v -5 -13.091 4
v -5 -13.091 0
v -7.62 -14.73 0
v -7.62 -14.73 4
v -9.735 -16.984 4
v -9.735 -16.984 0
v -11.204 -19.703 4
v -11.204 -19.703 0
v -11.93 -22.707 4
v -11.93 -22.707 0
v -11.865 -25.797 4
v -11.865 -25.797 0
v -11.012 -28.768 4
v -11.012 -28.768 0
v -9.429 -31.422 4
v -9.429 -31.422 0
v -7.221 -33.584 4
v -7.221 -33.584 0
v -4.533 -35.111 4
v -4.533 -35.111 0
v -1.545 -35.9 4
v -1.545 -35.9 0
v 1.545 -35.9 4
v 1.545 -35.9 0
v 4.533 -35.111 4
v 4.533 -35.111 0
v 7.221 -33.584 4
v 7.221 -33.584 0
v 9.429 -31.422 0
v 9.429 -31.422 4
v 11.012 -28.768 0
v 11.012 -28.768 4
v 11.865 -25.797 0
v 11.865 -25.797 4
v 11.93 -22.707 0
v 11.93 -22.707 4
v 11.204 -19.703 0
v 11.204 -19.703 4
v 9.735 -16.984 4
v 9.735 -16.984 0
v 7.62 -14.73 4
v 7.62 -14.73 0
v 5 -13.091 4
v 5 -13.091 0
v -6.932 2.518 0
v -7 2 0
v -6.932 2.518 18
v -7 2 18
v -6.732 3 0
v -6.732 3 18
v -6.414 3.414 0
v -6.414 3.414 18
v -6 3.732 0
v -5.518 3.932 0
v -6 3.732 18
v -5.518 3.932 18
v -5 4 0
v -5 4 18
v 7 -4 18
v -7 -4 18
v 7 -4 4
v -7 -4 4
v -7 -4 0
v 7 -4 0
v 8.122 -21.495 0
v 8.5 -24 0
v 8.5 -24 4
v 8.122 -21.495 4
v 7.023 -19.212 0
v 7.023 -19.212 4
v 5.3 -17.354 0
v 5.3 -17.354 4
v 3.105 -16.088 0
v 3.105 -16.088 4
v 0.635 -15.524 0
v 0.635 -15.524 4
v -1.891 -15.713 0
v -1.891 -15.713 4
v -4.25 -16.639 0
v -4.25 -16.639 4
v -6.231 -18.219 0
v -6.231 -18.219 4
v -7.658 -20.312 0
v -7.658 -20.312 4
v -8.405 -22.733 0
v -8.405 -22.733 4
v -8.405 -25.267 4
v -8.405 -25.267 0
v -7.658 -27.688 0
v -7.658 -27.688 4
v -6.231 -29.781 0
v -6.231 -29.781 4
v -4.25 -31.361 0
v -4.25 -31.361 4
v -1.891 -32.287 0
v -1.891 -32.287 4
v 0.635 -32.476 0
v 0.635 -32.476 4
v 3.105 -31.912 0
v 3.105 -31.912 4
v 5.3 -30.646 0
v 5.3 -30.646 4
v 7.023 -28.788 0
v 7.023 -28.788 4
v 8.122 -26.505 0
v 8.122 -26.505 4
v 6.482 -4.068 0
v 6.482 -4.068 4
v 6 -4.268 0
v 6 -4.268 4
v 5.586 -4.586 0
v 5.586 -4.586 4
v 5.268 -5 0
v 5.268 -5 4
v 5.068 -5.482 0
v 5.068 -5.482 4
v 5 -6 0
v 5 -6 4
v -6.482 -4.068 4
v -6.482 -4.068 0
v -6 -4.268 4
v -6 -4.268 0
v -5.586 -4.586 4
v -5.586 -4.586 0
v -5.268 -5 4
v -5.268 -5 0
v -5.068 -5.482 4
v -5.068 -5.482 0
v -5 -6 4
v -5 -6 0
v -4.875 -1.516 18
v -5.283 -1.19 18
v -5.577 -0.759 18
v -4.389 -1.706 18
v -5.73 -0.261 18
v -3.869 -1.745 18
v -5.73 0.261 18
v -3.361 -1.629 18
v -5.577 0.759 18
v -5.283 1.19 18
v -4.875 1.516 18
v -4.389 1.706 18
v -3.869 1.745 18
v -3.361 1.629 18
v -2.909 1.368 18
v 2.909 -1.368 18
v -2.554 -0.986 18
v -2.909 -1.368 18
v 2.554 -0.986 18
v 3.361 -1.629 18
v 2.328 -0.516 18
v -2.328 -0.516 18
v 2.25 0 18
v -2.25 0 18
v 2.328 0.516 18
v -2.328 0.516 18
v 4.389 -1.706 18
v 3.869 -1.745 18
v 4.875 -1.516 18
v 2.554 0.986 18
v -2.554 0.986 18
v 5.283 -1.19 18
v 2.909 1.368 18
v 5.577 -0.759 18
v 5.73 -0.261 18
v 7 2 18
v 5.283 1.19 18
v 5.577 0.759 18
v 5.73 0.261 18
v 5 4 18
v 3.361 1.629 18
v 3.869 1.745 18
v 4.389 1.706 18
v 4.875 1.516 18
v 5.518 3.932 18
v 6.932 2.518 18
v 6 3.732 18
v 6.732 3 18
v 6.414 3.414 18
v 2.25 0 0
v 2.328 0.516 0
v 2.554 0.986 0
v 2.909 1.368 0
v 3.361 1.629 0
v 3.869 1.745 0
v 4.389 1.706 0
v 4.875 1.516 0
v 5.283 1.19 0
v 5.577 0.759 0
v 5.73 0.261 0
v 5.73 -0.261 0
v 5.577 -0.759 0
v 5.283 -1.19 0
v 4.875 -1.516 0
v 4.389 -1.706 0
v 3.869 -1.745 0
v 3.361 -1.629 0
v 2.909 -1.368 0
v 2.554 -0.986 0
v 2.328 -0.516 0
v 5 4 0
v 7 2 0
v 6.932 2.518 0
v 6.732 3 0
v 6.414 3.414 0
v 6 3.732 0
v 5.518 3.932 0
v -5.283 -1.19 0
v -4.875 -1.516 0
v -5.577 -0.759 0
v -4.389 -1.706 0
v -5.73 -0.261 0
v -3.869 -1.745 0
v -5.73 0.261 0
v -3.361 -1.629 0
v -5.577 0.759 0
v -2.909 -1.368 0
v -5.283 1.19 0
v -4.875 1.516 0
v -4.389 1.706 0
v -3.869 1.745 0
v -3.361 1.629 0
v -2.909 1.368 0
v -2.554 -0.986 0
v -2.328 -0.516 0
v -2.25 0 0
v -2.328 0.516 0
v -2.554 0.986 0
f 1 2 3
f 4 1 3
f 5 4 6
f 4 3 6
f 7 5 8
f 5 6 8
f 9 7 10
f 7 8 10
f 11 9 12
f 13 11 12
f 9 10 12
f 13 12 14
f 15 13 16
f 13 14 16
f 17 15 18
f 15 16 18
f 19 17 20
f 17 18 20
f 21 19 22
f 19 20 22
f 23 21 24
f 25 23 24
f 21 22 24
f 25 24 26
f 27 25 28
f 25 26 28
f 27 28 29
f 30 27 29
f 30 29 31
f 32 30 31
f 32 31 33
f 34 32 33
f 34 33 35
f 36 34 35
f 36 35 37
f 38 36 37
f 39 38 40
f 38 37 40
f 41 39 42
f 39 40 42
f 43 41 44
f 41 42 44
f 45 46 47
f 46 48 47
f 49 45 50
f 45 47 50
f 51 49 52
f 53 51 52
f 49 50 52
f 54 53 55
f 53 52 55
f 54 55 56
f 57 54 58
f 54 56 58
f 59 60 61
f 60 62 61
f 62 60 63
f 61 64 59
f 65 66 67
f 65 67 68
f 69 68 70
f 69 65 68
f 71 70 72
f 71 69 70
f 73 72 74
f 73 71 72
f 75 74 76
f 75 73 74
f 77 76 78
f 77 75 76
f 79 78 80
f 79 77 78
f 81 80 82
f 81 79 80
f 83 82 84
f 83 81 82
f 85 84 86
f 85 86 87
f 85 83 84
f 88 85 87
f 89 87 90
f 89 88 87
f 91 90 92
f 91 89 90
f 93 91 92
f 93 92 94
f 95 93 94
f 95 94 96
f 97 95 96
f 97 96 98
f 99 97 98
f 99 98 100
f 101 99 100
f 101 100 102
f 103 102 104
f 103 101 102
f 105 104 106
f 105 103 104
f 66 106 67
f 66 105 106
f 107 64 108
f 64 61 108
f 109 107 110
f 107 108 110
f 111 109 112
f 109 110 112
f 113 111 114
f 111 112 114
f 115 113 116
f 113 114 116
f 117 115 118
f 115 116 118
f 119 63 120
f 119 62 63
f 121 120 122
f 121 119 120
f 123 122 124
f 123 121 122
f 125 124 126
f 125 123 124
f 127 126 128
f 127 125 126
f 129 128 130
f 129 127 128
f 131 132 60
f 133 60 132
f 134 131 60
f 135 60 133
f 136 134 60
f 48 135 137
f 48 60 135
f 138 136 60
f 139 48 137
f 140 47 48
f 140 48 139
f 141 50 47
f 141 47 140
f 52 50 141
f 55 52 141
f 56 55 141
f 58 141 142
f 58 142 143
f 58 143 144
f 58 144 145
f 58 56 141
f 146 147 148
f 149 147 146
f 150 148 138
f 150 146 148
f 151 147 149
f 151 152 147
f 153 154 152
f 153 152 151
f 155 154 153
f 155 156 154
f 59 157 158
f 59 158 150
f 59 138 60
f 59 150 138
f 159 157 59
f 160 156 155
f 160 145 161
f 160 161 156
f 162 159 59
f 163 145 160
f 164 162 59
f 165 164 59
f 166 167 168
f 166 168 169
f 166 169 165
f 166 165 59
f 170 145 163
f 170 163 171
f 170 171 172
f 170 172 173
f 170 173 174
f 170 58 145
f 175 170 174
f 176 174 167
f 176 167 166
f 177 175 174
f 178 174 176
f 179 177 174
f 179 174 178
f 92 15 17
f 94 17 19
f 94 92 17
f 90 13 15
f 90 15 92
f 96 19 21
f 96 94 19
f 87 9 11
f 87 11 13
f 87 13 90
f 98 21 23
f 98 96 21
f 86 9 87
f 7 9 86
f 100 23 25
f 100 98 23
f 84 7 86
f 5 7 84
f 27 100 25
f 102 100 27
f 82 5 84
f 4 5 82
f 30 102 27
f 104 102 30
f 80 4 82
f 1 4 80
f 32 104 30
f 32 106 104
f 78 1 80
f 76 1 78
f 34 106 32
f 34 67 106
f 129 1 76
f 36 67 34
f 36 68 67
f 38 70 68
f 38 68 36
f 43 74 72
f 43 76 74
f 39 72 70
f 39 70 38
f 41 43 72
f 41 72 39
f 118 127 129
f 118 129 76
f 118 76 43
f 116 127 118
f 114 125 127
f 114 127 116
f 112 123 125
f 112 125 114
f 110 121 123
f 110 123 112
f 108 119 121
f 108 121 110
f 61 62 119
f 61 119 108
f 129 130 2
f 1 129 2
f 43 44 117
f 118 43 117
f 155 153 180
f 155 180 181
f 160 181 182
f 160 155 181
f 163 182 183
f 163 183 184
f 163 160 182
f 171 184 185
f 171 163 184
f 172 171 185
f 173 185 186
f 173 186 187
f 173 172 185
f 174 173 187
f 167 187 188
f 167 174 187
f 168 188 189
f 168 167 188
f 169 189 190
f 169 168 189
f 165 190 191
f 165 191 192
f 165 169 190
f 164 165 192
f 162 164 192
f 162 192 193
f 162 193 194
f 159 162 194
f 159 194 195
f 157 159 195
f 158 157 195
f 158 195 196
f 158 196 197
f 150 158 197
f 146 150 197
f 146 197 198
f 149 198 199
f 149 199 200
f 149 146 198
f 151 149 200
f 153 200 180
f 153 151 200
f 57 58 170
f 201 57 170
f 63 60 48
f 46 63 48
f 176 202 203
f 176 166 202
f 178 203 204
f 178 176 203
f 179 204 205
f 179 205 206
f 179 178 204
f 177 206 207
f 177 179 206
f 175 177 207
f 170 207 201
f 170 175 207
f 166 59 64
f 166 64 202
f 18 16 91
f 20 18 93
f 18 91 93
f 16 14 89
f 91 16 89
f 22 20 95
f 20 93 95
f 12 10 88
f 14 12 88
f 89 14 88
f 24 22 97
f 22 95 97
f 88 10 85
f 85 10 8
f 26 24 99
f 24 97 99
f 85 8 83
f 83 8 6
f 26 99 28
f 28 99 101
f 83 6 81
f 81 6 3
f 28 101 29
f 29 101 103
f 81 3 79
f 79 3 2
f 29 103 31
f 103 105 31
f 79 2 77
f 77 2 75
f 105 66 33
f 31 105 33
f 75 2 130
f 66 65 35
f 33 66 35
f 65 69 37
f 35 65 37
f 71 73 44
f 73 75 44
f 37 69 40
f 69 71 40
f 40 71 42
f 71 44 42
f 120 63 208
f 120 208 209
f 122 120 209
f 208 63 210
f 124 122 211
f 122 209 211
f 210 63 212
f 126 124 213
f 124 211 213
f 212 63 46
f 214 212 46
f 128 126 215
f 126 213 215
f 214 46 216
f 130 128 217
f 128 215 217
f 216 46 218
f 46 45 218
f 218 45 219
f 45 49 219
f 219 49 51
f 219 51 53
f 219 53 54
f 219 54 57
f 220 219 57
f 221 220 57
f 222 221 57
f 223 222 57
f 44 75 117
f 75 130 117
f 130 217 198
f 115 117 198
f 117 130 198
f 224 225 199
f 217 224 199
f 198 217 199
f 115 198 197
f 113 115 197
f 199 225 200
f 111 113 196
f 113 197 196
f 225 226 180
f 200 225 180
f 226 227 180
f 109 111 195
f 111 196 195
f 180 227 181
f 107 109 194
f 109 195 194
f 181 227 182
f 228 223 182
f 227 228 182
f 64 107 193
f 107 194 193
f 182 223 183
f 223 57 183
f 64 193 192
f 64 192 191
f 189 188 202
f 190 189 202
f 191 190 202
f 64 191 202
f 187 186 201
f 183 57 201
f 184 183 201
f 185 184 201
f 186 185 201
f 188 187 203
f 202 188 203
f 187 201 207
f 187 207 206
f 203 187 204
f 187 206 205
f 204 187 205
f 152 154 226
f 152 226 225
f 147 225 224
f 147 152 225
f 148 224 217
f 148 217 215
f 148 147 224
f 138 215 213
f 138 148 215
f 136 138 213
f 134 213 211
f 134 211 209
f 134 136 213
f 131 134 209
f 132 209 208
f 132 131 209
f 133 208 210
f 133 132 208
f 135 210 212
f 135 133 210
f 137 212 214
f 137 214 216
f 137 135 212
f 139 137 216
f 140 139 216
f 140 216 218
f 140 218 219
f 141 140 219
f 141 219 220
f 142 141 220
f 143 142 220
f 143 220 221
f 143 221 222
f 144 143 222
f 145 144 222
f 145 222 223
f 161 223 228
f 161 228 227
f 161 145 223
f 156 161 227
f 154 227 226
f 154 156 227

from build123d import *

# Parameters (mm, degrees)
SKETCH_1_W          = 14
SKETCH_1_H          = 8
EXTRUDE_1_DEPTH     = 18
SKETCH_1_3_R        = 8.5
EXTRUDE_2_DEPTH     = 4
FILLET_1_R          = 2
CUT_EXTRUDE_START   = -18
SKETCH_5_R          = 1.75
CUT_EXTRUDE_1_DEPTH = 18
FILLET_3_R          = 2


with BuildPart() as part:
    # 草图1 → 凸台-拉伸1 (new body)
    with BuildSketch(Plane.XY):
        Rectangle(SKETCH_1_W, SKETCH_1_H)
    extrude(amount=EXTRUDE_1_DEPTH)

    # 草图1<3> → 凸台-拉伸2 (add)
    with BuildSketch(Plane.XY):
        with BuildLine():
            Line((5, -13.091287885), (5, -4))
            Line((5, -4), (-5, -4))
            Line((-5, -4), (-5, -13.091287885))
            ThreePointArc((-5, -13.091287885), (0, -36), (5, -13.091287885))
        make_face()
        with Locations((0, -24)):
            Circle(SKETCH_1_3_R, mode=Mode.SUBTRACT)
    extrude(amount=EXTRUDE_2_DEPTH)

    # 圆角1
    fillet_1_edges = [part.edges().sort_by_distance(p)[0] for p in [
        (-5, -4, 2),
        (5, -4, 2),
    ]]
    fillet(fillet_1_edges, radius=FILLET_1_R - 0.0001)  # a hair under: the kernel refuses the full size

    # 草图5 → 切除-拉伸1 (cut)
    with BuildSketch(Plane(origin=(0, 0, 0), x_dir=(-1, 0, 0), z_dir=(0, 0, -1)).offset(CUT_EXTRUDE_START)):
        with Locations((-4, 0)):
            Circle(SKETCH_5_R)
        with Locations(Location((4, 0, 0), (0, 0, 180))):
            Circle(SKETCH_5_R)
    extrude(amount=CUT_EXTRUDE_1_DEPTH, mode=Mode.SUBTRACT)

    # 圆角3
    fillet_3_edges = [part.edges().sort_by_distance(p)[0] for p in [
        (-7, 4, 9),
        (7, 4, 9),
    ]]
    fillet(fillet_3_edges, radius=FILLET_3_R)


solid = part.part
